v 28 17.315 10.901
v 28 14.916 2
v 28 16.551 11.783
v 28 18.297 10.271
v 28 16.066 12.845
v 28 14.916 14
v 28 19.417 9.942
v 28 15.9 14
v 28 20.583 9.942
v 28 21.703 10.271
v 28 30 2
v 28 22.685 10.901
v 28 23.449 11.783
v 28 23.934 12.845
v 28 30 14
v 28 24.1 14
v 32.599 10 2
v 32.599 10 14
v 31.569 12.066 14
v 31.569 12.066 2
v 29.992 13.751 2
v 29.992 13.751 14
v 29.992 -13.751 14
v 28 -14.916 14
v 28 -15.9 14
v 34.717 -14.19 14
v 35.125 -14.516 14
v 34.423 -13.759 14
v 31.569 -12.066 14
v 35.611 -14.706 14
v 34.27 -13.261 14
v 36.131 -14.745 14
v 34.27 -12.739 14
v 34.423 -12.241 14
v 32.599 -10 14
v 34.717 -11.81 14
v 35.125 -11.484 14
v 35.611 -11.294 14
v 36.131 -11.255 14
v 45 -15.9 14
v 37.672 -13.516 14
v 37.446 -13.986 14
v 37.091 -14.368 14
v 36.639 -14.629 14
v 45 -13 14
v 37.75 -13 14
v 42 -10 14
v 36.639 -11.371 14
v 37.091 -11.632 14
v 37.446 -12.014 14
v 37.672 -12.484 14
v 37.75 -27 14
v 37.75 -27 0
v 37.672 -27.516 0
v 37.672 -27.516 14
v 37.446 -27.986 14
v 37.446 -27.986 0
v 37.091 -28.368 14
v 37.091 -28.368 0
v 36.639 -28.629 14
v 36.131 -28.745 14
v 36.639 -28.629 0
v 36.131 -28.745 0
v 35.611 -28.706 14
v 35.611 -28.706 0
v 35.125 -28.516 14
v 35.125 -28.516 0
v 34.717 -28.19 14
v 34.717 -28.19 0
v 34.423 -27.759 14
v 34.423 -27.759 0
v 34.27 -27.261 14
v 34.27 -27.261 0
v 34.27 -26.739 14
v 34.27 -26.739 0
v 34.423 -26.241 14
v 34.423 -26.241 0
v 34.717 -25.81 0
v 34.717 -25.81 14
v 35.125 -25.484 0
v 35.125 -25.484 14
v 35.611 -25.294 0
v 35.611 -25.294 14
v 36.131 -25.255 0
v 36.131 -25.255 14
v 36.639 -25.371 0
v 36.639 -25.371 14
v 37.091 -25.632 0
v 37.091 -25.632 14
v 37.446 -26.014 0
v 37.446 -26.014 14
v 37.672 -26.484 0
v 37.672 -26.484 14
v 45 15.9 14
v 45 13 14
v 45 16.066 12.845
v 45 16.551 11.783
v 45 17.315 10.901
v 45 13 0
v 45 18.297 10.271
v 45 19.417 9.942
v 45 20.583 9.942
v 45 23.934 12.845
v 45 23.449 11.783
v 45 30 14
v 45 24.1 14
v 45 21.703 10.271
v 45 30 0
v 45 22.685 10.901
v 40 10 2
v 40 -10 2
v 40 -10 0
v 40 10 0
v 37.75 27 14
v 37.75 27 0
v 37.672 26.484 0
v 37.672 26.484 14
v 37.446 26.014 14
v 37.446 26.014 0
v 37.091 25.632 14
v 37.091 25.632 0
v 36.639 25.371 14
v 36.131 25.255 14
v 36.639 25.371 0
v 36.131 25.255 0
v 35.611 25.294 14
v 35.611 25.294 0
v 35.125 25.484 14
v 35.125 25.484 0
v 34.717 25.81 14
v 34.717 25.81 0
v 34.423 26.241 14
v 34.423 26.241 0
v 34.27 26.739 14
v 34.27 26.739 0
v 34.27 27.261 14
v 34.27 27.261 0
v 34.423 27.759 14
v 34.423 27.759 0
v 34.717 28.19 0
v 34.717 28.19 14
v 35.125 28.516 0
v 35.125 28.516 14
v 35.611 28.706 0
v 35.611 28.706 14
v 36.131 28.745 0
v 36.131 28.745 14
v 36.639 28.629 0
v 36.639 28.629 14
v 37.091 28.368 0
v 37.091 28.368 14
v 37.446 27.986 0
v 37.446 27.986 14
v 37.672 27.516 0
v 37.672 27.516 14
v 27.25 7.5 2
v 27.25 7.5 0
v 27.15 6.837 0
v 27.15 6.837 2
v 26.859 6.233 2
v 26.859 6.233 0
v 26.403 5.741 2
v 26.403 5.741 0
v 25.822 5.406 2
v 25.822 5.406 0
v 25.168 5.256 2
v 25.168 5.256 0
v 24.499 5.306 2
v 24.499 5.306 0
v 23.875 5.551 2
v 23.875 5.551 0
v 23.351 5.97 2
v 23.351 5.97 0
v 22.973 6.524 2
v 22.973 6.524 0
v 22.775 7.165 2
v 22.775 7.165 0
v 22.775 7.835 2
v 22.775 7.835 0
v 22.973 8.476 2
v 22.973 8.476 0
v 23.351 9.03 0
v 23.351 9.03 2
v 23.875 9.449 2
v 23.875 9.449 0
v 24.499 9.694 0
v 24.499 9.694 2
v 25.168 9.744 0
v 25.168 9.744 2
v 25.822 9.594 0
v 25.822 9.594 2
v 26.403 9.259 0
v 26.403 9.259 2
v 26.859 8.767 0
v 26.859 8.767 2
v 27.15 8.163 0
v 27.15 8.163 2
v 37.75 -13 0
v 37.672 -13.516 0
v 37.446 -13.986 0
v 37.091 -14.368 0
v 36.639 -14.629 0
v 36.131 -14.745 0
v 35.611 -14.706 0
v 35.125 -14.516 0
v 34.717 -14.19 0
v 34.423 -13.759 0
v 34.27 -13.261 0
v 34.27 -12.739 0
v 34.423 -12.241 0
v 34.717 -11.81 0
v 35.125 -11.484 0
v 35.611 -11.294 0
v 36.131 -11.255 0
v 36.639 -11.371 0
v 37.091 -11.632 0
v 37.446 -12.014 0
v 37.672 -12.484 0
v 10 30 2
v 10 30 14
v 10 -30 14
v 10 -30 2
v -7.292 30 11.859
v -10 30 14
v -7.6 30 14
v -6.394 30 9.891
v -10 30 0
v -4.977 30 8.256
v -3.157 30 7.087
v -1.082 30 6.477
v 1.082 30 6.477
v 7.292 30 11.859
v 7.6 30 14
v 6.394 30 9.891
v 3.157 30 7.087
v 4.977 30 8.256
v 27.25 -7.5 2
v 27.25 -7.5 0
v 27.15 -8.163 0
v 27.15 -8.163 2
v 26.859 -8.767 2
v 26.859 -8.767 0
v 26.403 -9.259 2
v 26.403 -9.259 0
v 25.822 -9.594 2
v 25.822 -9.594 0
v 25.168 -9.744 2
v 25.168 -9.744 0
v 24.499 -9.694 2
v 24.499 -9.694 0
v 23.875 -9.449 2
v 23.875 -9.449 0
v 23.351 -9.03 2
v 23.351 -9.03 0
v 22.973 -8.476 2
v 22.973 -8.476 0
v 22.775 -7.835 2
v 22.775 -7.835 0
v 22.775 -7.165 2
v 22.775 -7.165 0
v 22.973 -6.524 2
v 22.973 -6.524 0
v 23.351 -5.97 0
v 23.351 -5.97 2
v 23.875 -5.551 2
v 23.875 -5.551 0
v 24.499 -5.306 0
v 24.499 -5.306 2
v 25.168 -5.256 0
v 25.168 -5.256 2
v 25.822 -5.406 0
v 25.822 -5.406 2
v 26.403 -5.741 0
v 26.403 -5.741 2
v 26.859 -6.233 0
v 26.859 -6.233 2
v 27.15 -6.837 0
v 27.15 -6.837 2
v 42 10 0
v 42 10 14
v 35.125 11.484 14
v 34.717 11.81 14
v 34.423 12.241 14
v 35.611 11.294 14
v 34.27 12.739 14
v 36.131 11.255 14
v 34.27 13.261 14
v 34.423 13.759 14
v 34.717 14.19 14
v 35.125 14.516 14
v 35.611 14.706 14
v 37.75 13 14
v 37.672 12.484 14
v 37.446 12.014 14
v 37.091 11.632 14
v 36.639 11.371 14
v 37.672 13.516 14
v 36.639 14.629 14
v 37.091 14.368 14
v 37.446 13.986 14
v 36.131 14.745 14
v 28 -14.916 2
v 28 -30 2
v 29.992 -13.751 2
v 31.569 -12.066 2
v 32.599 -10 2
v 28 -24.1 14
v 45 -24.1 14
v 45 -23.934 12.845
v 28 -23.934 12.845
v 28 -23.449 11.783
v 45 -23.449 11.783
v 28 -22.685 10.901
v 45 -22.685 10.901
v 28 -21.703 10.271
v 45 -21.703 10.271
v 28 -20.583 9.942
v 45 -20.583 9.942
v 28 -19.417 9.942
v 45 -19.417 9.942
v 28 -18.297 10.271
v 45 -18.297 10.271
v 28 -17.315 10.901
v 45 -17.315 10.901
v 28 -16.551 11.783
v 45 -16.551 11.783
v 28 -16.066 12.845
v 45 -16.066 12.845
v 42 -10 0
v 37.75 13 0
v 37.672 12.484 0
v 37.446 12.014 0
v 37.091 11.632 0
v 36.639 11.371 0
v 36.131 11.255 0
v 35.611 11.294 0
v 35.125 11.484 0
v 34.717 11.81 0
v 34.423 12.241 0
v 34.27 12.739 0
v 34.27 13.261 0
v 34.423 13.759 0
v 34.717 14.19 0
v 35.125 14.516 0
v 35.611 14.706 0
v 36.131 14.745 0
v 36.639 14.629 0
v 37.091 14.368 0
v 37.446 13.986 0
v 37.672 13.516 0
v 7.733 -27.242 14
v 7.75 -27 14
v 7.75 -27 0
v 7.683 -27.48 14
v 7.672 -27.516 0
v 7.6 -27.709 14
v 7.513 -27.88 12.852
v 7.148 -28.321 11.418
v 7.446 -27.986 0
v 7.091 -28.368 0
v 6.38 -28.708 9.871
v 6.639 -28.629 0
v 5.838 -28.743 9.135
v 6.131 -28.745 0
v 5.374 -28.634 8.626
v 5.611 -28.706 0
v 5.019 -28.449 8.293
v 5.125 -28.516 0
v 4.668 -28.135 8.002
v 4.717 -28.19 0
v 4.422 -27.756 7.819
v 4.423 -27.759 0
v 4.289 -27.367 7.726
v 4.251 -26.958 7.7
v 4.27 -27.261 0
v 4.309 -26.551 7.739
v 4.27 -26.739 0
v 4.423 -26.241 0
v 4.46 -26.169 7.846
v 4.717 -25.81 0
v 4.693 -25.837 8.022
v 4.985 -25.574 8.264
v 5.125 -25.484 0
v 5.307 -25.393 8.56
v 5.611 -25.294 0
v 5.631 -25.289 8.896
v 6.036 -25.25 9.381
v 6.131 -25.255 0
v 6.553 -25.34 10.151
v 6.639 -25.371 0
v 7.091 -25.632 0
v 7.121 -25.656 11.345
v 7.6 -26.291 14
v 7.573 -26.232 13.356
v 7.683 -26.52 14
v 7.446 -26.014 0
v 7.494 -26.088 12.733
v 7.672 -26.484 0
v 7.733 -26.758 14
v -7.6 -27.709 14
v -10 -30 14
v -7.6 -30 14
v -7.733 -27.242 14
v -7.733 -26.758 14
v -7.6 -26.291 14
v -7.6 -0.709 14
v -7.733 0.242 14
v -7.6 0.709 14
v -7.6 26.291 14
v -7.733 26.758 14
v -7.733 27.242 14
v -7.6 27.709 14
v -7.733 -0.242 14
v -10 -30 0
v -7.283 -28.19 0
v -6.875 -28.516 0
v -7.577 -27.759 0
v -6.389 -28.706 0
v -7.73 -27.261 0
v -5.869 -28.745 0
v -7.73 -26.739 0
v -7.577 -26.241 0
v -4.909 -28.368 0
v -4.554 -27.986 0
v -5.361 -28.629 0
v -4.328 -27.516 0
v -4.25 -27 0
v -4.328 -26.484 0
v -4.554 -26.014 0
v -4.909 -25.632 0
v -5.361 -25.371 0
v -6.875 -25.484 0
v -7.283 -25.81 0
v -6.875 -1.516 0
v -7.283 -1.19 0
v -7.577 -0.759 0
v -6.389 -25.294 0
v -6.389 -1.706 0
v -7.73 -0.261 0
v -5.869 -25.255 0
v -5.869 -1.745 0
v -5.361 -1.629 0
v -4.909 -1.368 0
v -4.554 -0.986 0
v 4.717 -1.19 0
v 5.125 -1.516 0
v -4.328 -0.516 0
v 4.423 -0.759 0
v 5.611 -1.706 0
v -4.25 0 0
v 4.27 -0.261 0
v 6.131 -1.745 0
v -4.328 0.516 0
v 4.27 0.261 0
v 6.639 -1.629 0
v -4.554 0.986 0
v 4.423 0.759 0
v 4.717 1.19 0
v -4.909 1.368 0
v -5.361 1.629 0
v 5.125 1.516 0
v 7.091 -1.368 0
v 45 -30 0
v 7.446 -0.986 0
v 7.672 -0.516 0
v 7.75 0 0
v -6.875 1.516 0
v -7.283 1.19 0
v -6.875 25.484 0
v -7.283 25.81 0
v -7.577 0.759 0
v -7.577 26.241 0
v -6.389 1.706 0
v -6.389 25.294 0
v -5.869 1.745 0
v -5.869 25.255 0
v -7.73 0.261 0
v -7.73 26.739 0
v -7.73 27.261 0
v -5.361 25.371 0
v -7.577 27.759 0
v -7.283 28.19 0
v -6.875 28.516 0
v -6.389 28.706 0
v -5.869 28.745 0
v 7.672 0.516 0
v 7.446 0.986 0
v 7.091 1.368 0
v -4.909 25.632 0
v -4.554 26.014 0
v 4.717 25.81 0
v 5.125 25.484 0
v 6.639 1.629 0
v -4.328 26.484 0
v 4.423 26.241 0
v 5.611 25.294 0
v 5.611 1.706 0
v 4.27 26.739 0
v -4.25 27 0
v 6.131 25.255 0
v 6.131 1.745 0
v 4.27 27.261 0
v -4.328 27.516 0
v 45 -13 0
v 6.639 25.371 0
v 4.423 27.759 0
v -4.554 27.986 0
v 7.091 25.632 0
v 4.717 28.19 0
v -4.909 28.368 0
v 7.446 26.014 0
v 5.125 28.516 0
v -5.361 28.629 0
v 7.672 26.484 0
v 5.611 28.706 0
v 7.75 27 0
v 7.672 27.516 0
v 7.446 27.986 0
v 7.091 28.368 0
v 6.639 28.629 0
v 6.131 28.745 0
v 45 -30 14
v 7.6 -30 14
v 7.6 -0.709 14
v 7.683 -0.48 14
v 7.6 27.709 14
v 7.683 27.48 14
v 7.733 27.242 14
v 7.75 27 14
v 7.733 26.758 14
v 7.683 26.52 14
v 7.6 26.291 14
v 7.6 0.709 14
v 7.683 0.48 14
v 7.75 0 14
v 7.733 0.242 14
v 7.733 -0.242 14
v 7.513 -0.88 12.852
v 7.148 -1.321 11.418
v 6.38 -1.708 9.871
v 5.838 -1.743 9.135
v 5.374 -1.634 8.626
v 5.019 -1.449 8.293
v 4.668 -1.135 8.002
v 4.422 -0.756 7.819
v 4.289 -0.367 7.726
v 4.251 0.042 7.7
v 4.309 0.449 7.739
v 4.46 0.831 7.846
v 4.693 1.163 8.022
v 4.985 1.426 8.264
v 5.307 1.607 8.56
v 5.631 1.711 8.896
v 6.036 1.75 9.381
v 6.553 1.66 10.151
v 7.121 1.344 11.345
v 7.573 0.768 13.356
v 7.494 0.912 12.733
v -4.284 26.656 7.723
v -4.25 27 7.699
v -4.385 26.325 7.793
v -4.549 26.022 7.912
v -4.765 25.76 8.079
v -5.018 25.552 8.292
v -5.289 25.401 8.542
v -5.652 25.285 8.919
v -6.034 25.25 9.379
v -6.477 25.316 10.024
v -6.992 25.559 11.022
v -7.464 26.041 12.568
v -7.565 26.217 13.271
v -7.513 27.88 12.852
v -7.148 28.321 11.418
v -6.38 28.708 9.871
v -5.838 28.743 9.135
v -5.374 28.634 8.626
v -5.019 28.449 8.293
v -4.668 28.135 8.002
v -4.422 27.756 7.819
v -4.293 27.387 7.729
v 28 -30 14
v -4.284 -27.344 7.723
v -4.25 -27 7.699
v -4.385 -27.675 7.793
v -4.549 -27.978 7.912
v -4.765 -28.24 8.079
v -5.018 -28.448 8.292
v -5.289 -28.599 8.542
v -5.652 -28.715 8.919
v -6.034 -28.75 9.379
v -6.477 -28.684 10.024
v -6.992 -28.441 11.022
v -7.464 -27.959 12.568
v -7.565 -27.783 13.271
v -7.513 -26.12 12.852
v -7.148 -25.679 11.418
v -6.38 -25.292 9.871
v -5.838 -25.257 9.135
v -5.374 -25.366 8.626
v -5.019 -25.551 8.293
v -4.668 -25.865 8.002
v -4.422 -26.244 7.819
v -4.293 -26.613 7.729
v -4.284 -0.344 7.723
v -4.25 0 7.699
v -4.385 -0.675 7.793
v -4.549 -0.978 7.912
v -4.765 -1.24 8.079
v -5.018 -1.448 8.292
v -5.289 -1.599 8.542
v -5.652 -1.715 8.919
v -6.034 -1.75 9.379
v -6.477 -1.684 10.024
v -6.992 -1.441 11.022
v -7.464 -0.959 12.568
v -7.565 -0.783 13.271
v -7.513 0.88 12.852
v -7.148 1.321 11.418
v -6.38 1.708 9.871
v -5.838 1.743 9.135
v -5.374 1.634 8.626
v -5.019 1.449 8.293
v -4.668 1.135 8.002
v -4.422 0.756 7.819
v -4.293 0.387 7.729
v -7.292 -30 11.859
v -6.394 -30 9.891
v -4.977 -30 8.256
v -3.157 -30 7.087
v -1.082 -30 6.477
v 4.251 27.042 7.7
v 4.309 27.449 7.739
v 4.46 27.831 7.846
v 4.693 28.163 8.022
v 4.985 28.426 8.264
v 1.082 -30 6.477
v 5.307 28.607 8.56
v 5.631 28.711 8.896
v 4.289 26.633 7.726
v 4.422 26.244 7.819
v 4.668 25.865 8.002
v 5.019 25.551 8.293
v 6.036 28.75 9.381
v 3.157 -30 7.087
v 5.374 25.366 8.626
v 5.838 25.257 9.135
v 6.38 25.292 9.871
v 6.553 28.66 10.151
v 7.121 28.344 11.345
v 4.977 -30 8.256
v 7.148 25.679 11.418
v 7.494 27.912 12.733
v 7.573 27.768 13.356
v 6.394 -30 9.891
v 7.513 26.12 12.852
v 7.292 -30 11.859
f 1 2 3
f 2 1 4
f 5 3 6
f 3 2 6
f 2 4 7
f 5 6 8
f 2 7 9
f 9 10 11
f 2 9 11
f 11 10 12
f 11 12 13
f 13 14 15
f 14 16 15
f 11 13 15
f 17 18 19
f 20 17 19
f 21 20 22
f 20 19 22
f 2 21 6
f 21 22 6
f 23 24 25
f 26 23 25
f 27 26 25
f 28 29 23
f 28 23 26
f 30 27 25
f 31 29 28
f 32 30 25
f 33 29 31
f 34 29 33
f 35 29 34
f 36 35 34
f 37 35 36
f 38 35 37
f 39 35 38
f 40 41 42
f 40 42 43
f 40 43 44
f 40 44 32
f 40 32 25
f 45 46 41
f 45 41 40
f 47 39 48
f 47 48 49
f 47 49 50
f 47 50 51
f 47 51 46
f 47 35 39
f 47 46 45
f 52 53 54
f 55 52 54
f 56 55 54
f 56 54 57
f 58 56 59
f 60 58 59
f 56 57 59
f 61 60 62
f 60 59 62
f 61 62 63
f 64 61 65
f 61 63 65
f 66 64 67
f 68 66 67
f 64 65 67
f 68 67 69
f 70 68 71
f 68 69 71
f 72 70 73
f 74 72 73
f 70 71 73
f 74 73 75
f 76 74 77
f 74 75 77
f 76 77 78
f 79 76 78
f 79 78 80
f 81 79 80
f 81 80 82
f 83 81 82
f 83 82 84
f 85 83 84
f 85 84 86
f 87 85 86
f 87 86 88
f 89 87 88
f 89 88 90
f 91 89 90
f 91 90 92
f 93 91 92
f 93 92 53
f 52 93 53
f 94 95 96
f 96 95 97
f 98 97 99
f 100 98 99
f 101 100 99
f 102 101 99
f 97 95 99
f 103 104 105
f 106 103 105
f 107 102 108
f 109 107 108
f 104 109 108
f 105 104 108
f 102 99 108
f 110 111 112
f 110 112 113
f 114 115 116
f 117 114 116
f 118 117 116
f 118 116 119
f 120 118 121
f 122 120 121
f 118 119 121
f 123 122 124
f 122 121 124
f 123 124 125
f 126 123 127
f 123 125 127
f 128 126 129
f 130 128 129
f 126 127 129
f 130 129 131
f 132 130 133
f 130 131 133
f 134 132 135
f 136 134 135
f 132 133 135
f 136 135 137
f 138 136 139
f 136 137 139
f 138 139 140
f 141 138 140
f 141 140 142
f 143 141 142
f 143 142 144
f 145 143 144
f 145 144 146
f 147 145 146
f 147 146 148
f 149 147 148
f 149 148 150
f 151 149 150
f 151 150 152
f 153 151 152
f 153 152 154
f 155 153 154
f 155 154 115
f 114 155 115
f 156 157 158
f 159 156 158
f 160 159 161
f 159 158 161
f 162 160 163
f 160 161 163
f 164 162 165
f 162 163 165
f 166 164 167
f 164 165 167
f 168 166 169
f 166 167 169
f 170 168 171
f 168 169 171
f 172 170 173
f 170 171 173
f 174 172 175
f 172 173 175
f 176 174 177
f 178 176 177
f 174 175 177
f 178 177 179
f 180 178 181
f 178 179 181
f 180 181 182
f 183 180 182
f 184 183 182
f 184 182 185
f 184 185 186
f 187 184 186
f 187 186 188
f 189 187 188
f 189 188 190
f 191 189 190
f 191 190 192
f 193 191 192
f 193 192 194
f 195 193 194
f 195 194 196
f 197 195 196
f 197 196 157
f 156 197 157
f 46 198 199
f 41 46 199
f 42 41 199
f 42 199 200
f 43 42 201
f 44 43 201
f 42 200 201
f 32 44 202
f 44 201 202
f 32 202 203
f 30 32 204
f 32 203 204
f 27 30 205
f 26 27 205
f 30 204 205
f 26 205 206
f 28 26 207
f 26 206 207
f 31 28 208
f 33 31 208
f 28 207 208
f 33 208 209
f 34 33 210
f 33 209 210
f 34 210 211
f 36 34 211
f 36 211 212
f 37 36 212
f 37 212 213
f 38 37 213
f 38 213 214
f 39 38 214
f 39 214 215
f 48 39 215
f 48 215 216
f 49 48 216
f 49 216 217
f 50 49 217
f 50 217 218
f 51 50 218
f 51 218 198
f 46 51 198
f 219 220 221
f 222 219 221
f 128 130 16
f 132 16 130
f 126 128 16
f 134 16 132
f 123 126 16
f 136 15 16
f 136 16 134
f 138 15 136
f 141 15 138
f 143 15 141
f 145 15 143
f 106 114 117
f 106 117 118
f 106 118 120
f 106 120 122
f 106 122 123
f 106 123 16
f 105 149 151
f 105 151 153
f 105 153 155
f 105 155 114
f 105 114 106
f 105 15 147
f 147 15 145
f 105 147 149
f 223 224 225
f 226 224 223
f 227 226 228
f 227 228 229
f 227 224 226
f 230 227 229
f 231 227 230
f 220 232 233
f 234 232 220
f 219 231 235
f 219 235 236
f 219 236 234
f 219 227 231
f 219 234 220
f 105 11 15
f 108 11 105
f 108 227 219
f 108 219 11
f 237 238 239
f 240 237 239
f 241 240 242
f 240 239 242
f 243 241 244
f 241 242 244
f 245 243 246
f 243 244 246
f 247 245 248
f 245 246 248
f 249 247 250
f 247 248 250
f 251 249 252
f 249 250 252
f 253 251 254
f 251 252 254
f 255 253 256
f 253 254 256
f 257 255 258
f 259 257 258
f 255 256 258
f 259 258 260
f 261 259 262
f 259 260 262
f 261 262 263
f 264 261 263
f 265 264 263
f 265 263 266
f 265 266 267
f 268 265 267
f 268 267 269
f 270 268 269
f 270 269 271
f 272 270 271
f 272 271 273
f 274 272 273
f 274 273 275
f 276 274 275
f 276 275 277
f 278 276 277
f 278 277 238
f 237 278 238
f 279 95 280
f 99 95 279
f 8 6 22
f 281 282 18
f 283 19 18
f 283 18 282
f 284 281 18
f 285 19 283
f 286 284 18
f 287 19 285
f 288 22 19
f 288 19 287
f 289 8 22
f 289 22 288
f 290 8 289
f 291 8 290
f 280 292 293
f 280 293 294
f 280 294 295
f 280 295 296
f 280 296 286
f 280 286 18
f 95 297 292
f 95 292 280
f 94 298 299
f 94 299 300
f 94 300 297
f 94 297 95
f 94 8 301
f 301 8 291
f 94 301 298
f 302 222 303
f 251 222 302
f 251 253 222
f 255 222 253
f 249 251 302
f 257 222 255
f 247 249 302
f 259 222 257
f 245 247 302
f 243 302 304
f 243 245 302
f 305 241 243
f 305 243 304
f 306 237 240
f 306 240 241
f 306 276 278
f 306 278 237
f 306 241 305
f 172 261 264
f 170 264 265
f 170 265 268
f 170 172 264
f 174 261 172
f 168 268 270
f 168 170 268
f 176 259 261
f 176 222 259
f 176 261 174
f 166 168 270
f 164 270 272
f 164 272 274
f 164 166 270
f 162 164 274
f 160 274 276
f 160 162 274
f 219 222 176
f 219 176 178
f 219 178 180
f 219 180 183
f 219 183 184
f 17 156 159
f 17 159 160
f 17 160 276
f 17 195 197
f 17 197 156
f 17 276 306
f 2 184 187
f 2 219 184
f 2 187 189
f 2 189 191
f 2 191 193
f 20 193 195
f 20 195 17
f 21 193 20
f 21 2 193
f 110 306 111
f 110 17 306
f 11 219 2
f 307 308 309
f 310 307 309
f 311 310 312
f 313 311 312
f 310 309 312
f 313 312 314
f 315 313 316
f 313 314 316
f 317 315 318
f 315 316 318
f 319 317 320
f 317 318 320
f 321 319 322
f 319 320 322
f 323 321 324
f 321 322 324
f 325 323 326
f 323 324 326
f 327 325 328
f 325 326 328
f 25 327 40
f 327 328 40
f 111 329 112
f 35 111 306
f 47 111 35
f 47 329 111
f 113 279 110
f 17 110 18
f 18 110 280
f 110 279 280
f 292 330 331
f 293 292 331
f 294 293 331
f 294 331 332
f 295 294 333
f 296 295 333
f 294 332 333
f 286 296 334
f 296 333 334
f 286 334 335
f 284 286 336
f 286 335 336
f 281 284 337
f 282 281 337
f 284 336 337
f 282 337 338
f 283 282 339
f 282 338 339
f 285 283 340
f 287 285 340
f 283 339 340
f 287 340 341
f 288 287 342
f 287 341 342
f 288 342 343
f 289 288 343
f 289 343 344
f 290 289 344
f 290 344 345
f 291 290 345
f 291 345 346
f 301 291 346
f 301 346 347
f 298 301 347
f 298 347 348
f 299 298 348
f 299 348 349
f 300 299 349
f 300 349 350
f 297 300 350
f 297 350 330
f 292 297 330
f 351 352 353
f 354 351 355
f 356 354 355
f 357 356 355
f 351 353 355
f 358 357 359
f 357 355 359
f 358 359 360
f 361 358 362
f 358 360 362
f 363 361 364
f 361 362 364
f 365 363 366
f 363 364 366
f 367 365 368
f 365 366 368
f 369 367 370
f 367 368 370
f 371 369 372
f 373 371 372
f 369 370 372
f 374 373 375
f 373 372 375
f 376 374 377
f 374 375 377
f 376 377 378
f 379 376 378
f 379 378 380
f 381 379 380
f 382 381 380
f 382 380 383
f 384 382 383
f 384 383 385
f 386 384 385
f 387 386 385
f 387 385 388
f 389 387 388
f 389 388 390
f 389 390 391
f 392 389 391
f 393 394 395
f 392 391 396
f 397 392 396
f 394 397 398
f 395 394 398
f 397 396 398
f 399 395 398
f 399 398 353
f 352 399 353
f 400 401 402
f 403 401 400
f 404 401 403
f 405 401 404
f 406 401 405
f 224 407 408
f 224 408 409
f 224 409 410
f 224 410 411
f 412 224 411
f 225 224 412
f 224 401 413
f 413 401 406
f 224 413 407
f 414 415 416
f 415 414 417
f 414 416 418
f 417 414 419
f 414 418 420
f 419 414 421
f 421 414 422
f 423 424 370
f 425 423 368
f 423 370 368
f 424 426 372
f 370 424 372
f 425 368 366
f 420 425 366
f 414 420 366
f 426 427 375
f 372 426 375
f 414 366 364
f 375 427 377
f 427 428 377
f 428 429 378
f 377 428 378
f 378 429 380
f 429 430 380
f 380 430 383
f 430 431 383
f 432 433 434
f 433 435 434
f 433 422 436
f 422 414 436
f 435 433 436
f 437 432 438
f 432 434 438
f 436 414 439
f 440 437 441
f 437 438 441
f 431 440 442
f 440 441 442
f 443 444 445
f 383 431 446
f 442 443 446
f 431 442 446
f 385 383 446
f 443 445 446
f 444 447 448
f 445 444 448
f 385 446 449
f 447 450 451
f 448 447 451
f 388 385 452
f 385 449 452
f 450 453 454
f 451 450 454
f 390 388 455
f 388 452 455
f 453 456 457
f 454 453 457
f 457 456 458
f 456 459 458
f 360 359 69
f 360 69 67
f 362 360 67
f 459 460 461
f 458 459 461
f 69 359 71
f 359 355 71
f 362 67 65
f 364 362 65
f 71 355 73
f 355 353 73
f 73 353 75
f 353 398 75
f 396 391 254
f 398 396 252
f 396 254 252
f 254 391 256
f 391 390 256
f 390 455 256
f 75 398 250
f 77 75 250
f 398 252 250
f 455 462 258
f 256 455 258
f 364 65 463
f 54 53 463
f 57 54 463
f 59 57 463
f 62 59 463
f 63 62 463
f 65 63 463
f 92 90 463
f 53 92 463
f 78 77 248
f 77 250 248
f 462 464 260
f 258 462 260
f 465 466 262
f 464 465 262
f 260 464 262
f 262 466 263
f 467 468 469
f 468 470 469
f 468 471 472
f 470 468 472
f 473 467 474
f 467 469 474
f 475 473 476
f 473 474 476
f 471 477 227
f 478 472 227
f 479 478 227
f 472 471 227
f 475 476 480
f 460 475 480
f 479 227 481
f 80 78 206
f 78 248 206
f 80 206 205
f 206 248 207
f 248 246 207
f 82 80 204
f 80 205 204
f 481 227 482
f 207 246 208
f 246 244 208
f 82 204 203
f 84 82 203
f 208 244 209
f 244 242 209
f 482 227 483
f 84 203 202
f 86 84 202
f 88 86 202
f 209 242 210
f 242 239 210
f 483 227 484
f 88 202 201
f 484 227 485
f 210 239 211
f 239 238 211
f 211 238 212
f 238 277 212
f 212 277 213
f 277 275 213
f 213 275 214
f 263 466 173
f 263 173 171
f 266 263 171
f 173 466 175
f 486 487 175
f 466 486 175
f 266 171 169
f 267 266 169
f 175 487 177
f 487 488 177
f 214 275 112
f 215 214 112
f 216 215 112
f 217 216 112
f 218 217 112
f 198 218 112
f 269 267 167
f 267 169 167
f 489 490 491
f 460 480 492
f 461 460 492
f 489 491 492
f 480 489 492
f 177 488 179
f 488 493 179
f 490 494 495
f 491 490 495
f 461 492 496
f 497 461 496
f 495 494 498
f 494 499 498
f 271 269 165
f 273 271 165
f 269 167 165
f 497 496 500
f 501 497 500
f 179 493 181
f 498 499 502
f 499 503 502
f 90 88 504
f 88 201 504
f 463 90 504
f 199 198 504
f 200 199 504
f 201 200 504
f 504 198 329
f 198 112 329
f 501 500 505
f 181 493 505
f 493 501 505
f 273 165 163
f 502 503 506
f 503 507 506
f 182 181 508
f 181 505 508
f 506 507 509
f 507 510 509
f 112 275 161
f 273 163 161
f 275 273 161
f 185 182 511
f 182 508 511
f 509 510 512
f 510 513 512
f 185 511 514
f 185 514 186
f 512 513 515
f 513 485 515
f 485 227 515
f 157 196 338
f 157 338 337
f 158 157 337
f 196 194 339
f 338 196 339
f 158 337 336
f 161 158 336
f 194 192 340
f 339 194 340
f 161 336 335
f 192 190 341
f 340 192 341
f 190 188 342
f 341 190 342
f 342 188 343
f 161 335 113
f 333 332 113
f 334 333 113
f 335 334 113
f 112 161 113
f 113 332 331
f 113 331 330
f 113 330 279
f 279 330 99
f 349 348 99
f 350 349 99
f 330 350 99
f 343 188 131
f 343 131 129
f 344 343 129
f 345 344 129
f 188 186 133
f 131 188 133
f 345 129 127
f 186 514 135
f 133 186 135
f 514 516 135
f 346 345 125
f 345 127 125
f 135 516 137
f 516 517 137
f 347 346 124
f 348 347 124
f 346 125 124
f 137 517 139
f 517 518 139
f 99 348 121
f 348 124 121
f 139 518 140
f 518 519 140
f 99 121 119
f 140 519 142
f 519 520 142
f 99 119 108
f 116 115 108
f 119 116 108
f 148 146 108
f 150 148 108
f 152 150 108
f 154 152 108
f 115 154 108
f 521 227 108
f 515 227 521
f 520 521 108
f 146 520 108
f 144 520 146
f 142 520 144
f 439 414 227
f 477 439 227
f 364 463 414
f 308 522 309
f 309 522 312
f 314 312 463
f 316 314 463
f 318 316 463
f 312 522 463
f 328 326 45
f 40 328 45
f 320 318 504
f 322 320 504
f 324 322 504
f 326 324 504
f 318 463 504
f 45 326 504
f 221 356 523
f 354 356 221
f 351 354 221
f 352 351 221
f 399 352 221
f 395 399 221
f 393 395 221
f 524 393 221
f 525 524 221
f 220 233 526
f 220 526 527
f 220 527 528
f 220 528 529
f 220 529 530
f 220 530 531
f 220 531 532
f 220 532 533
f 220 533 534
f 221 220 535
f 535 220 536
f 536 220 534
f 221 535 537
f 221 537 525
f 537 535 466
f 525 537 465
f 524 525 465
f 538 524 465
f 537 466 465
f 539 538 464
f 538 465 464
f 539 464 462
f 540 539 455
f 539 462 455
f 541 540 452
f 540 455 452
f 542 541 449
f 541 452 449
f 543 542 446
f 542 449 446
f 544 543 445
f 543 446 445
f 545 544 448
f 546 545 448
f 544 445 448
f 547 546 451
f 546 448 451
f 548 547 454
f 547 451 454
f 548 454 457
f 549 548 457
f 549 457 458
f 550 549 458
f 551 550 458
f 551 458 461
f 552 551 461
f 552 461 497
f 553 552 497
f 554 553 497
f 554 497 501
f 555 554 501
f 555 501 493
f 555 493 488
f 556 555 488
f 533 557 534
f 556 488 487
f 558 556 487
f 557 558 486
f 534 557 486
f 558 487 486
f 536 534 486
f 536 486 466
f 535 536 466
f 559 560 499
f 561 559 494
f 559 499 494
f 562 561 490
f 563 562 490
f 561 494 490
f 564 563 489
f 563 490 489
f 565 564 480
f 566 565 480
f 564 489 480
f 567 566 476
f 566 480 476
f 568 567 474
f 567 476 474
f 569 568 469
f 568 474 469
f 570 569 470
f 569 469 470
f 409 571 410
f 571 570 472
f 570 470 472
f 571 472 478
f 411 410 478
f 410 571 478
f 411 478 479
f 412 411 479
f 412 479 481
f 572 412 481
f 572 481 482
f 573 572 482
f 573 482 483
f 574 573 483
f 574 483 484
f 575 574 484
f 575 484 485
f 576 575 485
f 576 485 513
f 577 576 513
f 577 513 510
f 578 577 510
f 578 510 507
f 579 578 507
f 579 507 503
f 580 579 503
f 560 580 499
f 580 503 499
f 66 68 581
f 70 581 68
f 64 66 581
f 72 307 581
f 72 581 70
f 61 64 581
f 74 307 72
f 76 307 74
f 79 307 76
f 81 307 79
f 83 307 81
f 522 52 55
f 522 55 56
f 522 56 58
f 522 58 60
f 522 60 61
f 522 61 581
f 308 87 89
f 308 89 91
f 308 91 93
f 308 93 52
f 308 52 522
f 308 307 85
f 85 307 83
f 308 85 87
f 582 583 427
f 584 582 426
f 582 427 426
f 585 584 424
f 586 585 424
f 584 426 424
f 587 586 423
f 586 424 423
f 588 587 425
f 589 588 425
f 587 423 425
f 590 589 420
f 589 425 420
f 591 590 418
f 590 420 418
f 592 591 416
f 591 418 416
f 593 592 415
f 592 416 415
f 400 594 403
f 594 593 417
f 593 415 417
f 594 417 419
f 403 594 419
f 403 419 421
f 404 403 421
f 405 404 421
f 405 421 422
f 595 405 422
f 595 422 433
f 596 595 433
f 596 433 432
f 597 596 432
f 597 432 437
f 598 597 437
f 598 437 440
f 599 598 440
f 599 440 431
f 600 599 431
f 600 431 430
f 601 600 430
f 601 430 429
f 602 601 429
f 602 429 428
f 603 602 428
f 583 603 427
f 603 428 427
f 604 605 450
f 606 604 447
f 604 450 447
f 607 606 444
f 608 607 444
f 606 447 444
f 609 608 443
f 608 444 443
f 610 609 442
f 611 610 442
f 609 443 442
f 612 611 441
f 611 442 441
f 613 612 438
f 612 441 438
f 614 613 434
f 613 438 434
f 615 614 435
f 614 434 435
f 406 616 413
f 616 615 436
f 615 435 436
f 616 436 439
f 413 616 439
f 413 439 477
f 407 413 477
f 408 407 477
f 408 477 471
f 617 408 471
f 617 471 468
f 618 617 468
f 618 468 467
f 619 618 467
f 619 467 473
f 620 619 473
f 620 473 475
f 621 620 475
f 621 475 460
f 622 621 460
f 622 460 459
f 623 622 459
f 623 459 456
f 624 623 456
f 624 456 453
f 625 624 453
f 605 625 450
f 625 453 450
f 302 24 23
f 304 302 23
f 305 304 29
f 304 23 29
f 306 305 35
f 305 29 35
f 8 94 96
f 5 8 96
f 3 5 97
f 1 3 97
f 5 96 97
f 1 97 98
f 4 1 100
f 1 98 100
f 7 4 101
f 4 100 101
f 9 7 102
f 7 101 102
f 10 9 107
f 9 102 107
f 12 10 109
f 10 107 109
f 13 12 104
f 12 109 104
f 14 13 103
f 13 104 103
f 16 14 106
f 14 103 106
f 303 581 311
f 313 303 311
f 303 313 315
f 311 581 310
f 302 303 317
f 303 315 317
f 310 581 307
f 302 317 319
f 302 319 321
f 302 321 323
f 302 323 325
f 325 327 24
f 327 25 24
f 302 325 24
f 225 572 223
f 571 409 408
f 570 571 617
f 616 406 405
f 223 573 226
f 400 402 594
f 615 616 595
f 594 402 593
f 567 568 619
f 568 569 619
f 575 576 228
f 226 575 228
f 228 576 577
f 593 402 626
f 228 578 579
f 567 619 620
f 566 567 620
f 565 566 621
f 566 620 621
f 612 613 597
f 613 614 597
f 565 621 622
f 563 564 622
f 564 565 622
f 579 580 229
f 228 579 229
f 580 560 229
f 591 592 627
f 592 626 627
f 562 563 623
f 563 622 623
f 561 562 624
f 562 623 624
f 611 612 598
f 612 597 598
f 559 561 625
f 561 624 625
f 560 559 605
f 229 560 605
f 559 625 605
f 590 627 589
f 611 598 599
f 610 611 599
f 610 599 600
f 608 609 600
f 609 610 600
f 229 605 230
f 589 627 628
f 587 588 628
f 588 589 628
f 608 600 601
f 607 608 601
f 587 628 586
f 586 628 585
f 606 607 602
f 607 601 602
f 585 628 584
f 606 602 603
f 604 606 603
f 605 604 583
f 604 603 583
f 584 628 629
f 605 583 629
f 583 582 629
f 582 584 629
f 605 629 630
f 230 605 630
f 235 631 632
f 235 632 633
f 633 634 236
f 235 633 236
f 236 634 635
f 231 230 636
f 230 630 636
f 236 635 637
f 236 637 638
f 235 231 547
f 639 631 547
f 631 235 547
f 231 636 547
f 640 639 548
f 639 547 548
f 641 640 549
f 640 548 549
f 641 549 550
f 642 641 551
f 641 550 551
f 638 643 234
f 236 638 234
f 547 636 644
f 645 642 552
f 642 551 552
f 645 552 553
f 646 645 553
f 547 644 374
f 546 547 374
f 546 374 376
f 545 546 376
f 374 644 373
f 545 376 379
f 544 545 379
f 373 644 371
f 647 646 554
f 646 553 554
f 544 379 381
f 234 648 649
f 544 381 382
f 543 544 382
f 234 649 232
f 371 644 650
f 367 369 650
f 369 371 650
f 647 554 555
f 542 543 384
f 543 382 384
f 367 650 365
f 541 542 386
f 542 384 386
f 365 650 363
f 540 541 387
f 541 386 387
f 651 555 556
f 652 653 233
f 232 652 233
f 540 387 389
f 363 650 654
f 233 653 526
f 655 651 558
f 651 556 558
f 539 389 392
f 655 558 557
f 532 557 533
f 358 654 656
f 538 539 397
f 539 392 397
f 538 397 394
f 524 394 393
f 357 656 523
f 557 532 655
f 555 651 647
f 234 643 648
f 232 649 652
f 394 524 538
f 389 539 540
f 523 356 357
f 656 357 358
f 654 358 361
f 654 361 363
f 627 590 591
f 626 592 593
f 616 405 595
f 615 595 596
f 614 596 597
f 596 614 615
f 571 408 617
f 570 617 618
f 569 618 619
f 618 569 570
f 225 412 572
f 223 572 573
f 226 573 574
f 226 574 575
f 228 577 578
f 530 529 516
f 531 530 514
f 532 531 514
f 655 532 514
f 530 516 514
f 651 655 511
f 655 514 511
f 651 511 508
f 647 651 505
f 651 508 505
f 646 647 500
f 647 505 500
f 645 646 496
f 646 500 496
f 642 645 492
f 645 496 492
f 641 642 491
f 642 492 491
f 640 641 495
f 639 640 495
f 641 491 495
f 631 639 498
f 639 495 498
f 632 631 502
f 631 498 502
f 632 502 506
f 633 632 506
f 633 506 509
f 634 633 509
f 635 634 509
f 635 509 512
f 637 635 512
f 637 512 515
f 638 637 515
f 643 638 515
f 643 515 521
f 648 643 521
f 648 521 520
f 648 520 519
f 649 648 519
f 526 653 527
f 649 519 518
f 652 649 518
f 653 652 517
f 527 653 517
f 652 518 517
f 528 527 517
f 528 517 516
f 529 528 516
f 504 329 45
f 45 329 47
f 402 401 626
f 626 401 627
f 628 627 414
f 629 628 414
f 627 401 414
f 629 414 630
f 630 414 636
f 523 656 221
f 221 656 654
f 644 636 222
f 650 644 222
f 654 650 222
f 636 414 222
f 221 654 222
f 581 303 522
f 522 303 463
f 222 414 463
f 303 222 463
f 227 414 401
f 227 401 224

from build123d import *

# Parameters (mm, degrees)
SKETCH_W        = 55
SKETCH_H        = 60
PAD_DEPTH       = 14
SKETCH001_R     = 7.6
POCKET_DEPTH    = 60.001
SKETCH002_R     = 1.75
POCKET001_DEPTH = 14.001
POCKET002_DEPTH = 12
SKETCH004_R     = 2.25
POCKET003_DEPTH = 14.001
SKETCH008_R     = 4.1
POCKET005_DEPTH = 20
SKETCH010_W     = 20
SKETCH010_H     = 25
POCKET006_DEPTH = 5
CHAMFER_SIZE    = 3
CHAMFER001_SIZE = 3


with BuildPart() as part:
    # Sketch → Pad (new body)
    with BuildSketch(Plane.XY):
        with Locations((17.5, 0)):
            Rectangle(SKETCH_W, SKETCH_H)
    extrude(amount=PAD_DEPTH)

    # Sketch001 → Pocket (cut, through all)
    with BuildSketch(Plane.XZ.offset(30)):
        with Locations((0, 14)):
            Circle(SKETCH001_R)
    extrude(amount=-POCKET_DEPTH, mode=Mode.SUBTRACT)

    # Sketch002 → Pocket001 (cut, through all)
    with BuildSketch(Plane(origin=(0, 0, 0), x_dir=(1, 0, 0), z_dir=(0, 0, -1))):
        with Locations((-6, 27)):
            Circle(SKETCH002_R)
        with Locations((36, 27)):
            Circle(SKETCH002_R)
        with Locations((-6, -27)):
            Circle(SKETCH002_R)
        with Locations((36, -27)):
            Circle(SKETCH002_R)
        with Locations((6, 27)):
            Circle(SKETCH002_R)
        with Locations((6, -27)):
            Circle(SKETCH002_R)
        with Locations((6, 0)):
            Circle(SKETCH002_R)
        with Locations((-6, 0)):
            Circle(SKETCH002_R)
        with Locations((36, -13)):
            Circle(SKETCH002_R)
        with Locations((36, 13)):
            Circle(SKETCH002_R)
    extrude(amount=-POCKET001_DEPTH, mode=Mode.SUBTRACT)

    # Sketch003 → Pocket002 (cut)
    with BuildSketch(Plane.XY.offset(14)):
        with BuildLine():
            Line((10, 35), (10, -35))
            Line((10, -35), (28, -35))
            Line((28, -35), (28, -14.916198))
            ThreePointArc((28, -14.916198), (30.841983, -12.965458), (32.599342, -10))
            Line((32.599342, -10), (52.599342, -10))
            Line((52.599342, -10), (52.599342, 10))
            Line((52.599342, 10), (32.599342, 10))
            ThreePointArc((32.599342, 10), (30.841983, 12.965458), (28, 14.916198))
            Line((28, 14.916198), (28, 35))
            Line((28, 35), (10, 35))
        make_face()
    extrude(amount=-POCKET002_DEPTH, mode=Mode.SUBTRACT)

    # Sketch004 → Pocket003 (cut, through all)
    with BuildSketch(Plane(origin=(0, 0, 0), x_dir=(1, 0, 0), z_dir=(0, 0, -1))):
        with Locations((25, 7.5)):
            Circle(SKETCH004_R)
        with Locations((25, -7.5)):
            Circle(SKETCH004_R)
    extrude(amount=-POCKET003_DEPTH, mode=Mode.SUBTRACT)

    # Sketch008 → Pocket005 (cut)
    with BuildSketch(Plane.YZ.offset(45)):
        with Locations((-20, 14)):
            Circle(SKETCH008_R)
        with Locations((20, 14)):
            Circle(SKETCH008_R)
    extrude(amount=-POCKET005_DEPTH, mode=Mode.SUBTRACT)

    # Sketch010 → Pocket006 (cut)
    with BuildSketch(Plane.YZ.offset(45)):
        with Locations((0, 6.5)):
            Rectangle(SKETCH010_W, SKETCH010_H)
    extrude(amount=-POCKET006_DEPTH, mode=Mode.SUBTRACT)

    # Chamfer
    chamfer_edges = [part.edges().sort_by_distance(p)[0] for p in [
        (45, -10, 8),
    ]]
    chamfer(chamfer_edges, length=CHAMFER_SIZE)

    # Chamfer001
    chamfer001_edges = [part.edges().sort_by_distance(p)[0] for p in [
        (45, 10, 8),
    ]]
    chamfer(chamfer001_edges, length=CHAMFER001_SIZE)


solid = part.part
